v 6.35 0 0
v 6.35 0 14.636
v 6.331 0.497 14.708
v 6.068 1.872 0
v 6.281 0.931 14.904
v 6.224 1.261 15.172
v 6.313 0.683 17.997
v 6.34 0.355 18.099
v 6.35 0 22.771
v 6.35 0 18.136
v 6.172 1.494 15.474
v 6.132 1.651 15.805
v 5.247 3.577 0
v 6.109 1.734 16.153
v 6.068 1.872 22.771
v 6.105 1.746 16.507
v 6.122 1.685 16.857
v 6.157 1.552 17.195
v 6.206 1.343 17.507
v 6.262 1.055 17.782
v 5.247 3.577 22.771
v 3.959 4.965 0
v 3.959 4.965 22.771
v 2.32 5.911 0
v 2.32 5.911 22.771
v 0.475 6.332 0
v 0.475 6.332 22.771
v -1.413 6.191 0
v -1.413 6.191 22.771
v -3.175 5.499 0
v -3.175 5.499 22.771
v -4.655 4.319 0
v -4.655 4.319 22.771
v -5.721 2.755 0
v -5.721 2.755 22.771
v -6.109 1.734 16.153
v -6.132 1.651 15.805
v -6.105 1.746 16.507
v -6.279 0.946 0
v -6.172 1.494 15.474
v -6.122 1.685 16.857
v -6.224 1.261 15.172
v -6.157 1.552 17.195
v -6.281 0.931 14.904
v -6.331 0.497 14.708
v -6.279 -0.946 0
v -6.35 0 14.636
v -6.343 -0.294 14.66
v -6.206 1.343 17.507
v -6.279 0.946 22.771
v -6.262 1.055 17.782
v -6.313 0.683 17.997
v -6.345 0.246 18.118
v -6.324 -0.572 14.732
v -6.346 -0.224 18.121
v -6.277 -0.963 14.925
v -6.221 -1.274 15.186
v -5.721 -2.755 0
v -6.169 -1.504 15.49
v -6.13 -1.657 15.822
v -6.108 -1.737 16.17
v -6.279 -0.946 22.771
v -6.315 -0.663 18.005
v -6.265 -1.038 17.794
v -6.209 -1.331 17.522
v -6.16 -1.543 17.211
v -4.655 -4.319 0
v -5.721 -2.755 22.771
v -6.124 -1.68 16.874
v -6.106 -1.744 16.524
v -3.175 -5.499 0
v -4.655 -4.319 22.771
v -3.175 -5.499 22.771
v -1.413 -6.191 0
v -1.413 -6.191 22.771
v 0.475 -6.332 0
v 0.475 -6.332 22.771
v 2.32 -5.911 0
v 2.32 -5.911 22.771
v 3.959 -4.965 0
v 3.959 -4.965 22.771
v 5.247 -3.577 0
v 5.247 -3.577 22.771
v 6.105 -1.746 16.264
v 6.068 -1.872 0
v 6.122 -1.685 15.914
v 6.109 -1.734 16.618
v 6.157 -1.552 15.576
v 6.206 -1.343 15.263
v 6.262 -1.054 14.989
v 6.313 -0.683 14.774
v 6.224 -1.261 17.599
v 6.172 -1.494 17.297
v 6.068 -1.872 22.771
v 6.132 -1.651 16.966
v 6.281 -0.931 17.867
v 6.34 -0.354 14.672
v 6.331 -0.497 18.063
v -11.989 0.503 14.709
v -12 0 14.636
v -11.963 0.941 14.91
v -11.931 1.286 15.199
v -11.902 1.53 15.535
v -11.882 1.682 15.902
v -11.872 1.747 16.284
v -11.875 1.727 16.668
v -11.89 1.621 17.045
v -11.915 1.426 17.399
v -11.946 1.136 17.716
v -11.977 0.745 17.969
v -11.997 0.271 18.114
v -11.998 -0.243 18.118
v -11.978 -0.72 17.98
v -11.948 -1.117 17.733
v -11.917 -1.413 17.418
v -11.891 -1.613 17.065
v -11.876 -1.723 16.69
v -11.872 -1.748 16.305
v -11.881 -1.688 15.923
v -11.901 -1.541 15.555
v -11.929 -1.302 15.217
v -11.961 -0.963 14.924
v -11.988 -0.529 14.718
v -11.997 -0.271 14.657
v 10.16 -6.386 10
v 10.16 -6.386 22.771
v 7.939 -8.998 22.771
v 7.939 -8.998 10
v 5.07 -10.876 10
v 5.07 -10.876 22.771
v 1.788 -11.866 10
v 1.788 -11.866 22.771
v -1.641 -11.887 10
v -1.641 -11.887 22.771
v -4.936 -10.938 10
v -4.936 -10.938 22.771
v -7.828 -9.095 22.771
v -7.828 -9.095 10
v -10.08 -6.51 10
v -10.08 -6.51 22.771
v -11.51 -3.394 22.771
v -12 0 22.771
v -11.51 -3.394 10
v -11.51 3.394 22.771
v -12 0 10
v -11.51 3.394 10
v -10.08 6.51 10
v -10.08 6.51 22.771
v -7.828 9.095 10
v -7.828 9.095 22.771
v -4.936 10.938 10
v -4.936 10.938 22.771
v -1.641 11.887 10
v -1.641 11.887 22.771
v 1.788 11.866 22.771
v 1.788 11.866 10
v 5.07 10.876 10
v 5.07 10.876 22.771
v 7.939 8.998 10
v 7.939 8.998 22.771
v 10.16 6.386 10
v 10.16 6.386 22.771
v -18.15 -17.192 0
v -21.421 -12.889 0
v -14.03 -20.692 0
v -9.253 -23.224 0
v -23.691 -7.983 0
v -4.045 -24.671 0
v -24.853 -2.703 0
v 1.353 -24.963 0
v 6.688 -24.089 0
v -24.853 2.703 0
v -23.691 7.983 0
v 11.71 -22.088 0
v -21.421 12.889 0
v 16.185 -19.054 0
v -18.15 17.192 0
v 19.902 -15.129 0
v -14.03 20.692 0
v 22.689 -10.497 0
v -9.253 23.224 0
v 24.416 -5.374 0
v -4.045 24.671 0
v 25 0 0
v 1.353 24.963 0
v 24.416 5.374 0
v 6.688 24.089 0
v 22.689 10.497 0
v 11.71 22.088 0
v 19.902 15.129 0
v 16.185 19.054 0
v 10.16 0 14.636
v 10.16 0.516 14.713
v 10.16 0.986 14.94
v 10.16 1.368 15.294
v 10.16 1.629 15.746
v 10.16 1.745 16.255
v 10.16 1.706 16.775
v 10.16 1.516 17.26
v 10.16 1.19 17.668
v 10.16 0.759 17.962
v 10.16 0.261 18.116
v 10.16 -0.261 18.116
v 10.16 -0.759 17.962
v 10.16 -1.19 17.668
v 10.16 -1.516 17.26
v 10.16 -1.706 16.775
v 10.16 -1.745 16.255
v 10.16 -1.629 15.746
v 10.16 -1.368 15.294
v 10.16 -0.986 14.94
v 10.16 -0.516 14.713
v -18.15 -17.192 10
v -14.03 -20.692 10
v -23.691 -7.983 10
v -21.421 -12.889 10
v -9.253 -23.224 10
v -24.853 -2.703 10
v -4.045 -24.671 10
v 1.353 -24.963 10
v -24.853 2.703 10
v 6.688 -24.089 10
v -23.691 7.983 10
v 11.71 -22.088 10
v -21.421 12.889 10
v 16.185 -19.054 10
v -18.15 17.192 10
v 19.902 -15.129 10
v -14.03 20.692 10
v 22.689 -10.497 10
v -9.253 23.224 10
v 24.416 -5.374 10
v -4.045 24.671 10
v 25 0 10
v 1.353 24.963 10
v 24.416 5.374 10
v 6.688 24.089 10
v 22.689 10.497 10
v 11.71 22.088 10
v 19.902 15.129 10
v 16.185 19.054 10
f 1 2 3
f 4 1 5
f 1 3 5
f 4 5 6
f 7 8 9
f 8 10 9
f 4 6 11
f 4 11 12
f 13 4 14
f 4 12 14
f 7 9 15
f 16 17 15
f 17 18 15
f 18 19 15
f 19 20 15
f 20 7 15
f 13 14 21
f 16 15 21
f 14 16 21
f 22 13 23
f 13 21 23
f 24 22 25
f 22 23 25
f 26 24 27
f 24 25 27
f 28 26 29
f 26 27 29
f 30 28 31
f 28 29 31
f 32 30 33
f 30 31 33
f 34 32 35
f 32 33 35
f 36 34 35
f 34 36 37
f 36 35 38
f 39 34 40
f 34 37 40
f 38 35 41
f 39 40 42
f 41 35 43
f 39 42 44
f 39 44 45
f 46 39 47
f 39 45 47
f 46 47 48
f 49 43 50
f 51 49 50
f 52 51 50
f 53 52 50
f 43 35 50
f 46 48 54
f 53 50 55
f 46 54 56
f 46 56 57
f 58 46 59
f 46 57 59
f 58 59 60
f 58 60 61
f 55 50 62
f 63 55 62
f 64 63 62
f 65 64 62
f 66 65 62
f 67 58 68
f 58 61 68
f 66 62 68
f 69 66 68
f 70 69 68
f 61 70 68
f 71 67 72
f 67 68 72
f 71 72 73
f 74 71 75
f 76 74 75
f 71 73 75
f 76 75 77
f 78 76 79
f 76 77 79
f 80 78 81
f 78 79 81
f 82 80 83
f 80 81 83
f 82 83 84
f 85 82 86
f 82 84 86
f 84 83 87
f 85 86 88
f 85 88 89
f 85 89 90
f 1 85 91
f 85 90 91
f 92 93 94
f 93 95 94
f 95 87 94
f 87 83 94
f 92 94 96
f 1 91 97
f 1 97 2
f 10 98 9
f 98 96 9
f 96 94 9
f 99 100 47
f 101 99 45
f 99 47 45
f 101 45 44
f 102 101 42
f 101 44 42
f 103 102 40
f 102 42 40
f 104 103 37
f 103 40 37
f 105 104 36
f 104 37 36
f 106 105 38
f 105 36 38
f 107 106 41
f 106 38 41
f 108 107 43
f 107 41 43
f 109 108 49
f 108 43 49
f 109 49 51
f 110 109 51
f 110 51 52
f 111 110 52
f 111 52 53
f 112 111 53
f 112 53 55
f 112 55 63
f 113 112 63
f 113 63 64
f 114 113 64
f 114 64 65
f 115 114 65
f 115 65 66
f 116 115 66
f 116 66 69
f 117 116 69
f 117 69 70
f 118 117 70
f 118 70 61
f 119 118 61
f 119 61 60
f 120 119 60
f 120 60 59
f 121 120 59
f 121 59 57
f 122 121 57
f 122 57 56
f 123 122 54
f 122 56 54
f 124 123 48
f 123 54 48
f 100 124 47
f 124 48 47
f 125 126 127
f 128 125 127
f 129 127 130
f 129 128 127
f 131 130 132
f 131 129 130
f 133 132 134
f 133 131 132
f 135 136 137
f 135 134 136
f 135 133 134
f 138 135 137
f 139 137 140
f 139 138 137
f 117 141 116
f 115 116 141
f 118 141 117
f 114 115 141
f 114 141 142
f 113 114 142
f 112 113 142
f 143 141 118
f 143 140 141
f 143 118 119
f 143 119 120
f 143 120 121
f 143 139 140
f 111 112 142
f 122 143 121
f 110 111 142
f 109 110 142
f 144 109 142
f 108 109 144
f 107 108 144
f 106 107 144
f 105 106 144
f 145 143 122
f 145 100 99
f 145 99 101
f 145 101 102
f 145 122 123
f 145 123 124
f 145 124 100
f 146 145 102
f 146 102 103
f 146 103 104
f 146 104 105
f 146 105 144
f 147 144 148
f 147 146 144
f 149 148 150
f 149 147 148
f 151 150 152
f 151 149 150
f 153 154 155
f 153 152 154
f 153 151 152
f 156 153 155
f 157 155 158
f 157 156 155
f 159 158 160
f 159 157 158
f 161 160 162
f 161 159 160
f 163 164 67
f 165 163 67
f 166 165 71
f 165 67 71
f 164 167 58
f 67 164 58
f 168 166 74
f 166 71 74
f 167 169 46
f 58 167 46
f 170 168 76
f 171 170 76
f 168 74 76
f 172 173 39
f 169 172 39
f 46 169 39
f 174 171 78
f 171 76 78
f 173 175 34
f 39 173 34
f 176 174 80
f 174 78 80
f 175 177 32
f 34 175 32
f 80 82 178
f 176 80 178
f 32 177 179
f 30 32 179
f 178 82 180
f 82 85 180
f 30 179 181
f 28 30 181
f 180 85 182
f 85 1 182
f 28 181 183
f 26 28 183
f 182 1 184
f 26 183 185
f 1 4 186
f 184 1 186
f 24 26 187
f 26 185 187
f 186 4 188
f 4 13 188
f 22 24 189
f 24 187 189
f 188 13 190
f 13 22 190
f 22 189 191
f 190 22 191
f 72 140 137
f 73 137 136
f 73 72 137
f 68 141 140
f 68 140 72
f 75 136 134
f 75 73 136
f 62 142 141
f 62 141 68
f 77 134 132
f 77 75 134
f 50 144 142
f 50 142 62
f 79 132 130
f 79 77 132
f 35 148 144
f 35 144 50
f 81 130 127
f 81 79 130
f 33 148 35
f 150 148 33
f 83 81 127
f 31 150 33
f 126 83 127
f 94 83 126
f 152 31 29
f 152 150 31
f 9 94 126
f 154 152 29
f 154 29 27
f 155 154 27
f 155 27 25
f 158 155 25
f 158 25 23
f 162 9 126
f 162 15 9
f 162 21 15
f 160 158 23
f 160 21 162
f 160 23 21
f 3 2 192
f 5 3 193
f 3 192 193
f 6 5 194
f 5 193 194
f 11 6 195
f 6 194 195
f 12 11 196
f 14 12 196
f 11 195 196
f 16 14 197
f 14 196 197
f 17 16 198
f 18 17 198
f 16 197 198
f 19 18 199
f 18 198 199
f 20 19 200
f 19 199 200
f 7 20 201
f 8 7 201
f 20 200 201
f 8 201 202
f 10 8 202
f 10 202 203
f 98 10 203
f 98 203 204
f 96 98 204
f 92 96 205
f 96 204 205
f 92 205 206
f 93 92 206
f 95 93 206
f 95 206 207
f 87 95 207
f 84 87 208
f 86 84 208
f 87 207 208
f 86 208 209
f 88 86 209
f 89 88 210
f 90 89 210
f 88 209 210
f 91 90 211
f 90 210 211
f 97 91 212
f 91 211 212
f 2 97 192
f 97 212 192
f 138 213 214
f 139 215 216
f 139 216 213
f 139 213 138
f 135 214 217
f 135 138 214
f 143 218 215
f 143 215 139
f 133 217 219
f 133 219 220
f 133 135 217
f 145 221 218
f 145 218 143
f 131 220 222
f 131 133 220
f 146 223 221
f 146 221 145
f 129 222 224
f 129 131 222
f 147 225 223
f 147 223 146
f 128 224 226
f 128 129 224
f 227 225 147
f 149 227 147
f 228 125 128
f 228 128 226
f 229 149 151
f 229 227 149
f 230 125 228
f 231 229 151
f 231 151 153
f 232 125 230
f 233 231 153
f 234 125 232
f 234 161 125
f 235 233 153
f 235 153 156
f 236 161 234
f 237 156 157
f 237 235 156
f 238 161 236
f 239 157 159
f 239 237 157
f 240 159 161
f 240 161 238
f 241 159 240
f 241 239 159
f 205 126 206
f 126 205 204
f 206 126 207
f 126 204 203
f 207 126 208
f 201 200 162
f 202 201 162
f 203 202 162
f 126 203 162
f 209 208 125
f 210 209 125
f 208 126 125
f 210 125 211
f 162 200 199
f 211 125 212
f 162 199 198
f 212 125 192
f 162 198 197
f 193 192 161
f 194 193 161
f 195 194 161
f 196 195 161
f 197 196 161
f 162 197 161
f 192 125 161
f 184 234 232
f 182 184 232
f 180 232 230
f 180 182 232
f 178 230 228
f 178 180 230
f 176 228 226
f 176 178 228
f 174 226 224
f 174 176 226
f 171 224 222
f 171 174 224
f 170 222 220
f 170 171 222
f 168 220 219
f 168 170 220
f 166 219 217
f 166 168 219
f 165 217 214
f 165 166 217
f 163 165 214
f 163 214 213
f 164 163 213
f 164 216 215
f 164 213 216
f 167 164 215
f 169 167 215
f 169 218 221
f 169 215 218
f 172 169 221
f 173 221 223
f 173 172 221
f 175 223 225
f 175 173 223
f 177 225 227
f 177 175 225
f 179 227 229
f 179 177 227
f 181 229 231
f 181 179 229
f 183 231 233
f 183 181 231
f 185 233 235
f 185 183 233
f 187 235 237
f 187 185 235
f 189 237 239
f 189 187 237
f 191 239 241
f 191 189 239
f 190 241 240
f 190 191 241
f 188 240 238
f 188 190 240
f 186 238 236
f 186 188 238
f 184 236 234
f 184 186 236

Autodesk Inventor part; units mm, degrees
ref_plane "YZ Plane" through (0, 0, 0) normal (1, 0, 0) x (0, 1, 0)
ref_plane "XZ Plane" through (0, 0, 0) normal (0, 1, 0) x (-1, 0, 0)
ref_plane "XY Plane" through (0, 0, 0) normal (0, 0, 1) x (1, 0, 0)
sketch "Sketch1" plane through (0, 0, 0) normal (0, 0, 1) x (1, 0, 0)
  circle A0 centre (0, 0) radius 25
  dimension "d0" = 50
extrude "Extrusion1" add sketch "Sketch1" along normal blind 10
sketch "Sketch14" plane through (0, 0, 10) normal (0, 0, 1) x (1, 0, 0)
  circle A0 centre (0, 0) radius 12
  line L0 (10.16, 0) -> (10.16, 6.3855)
  line L1 (10.16, -6.3855) -> (10.16, 0)
  dimension "d16" = 24
extrude "Extrusion4" add sketch "Sketch14" along normal blind 12.771 contours L0 L1 A0 picked at (-4.553, 0)
sketch "Sketch19" plane through (0, 0, 22.771) normal (0, 0, 1) x (1, 0, 0)
  circle A0 centre (0, 0) radius 6.35
  dimension "d28" = 12.7
extrude "Extrusion7" cut sketch "Sketch19" against normal blind 18
sketch "Sketch22" plane through (10.16, -6.3855, 10) normal (1, 0, 0) x (0, 0, -1)
  line L0 (-12.771, 0) -> (-12.771, 12.771) projected
  circle A0 centre (-6.3855, 6.3855) radius 1.75
  point P0 (10, 6.3855)
  dimension "d40" = 3.5
extrude "Extrusion10" cut sketch "Sketch22" against normal blind 25
sketch "Sketch23" plane through (0, 0, 4.771) normal (0, 0, 1) x (1, 0, 0)
  circle A0 centre (0, 0) radius 6.35
  dimension "d43" = 12.7
extrude "Extrusion11" cut sketch "Sketch23" against normal blind 10
equation "\"BendRadius\" = Thickness"
equation "\"BendReliefWidth\" = Thickness"
equation "\"BendReliefDepth\" = 0.5 * Thickness"
equation "\"CornerReliefSize\" = 4 * Thickness"
equation "\"MinimumRemnant\" = 2 * Thickness"
equation "\"TransitionRadius\" = BendRadius"
equation "\"JacobiRadiusSize\" = BendRadius"
equation "\"GapSize\" = Thickness"
equation "\"Thickness\" = 0.5"
properties part number "Project_Stationary_Wheel_Final"
